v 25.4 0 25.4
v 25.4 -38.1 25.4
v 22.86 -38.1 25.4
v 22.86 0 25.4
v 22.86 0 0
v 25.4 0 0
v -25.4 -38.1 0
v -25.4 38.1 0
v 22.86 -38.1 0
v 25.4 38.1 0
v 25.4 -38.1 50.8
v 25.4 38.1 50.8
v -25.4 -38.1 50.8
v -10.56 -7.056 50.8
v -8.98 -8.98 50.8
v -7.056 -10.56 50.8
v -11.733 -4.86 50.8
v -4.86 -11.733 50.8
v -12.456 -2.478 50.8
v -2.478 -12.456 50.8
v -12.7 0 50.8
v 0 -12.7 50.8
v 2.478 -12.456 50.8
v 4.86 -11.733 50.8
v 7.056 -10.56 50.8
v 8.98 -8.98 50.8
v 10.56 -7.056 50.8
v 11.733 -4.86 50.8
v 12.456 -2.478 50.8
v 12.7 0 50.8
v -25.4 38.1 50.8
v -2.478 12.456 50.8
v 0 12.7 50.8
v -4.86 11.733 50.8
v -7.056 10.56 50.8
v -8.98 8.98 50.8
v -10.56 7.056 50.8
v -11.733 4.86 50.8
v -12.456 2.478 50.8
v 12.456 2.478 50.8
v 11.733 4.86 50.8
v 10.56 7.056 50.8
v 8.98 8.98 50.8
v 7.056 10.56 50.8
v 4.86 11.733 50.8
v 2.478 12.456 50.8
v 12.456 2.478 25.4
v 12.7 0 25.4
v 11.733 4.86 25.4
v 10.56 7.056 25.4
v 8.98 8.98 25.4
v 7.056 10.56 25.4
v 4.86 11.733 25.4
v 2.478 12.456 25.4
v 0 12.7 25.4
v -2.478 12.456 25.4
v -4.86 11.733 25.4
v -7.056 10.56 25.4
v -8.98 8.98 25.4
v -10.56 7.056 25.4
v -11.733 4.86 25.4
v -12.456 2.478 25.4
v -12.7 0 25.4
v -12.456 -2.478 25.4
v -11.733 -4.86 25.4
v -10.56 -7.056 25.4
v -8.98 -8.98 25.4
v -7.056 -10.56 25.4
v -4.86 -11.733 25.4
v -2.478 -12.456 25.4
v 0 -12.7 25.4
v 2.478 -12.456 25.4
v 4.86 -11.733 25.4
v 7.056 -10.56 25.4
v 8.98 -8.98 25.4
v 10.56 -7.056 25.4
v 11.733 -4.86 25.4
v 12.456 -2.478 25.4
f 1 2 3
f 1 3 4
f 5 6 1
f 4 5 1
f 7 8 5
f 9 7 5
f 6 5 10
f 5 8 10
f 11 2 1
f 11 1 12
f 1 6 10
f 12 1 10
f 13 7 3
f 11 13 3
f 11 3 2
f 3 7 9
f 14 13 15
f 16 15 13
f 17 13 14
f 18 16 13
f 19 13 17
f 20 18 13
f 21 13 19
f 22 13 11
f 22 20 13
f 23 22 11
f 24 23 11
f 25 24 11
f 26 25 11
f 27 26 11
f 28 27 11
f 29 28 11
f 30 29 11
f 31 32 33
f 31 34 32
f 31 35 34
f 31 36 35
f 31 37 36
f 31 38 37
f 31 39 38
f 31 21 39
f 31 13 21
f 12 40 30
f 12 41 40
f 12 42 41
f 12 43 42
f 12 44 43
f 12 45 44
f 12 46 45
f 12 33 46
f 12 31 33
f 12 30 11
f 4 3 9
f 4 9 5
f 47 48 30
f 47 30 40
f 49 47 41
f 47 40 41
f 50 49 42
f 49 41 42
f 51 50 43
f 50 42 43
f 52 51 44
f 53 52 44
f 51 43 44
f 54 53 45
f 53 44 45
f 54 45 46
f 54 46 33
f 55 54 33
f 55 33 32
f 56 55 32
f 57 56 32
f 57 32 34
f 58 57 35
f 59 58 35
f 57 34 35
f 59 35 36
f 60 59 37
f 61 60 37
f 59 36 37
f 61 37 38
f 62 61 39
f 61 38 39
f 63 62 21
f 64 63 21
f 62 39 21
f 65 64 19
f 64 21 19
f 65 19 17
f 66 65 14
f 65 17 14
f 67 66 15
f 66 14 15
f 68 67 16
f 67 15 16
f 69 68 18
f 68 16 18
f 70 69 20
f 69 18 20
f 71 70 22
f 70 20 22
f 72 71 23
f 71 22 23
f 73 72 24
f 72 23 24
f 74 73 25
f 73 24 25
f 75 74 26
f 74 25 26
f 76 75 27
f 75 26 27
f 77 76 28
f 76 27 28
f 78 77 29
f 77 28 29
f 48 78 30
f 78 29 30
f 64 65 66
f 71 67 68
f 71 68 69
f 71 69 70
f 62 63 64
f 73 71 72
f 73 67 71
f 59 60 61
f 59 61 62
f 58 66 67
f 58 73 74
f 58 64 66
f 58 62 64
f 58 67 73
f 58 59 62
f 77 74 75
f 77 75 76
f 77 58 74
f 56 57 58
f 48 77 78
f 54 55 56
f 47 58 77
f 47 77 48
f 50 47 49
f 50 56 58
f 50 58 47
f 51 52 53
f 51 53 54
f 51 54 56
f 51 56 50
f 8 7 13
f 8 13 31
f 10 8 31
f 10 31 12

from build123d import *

# Parameters (mm, degrees)
F0_W     = 50.8
F0_H     = 76.2
F1_DEPTH = 50.8
F2_R     = 12.7
F3_DEPTH = 25.4
F4_W     = 38.1
F4_H     = 25.4
F5_DEPTH = 2.54


with BuildPart() as f1:
    # F0 (on Top) → F1 (new body)
    with BuildSketch(Plane.XY):
        Rectangle(F0_W, F0_H)
    extrude(amount=F1_DEPTH)

    # F2 (on face) → F3 (cut)
    with BuildSketch(Plane.XY.offset(50.8)):
        Circle(F2_R)
    extrude(amount=-F3_DEPTH, mode=Mode.SUBTRACT)

    # F4 (on face) → F5 (cut)
    with BuildSketch(Plane.YZ.offset(25.4)):
        with Locations((-19.05, 12.7)):
            Rectangle(F4_W, F4_H)
    extrude(amount=-F5_DEPTH, mode=Mode.SUBTRACT)


solid = f1.part
